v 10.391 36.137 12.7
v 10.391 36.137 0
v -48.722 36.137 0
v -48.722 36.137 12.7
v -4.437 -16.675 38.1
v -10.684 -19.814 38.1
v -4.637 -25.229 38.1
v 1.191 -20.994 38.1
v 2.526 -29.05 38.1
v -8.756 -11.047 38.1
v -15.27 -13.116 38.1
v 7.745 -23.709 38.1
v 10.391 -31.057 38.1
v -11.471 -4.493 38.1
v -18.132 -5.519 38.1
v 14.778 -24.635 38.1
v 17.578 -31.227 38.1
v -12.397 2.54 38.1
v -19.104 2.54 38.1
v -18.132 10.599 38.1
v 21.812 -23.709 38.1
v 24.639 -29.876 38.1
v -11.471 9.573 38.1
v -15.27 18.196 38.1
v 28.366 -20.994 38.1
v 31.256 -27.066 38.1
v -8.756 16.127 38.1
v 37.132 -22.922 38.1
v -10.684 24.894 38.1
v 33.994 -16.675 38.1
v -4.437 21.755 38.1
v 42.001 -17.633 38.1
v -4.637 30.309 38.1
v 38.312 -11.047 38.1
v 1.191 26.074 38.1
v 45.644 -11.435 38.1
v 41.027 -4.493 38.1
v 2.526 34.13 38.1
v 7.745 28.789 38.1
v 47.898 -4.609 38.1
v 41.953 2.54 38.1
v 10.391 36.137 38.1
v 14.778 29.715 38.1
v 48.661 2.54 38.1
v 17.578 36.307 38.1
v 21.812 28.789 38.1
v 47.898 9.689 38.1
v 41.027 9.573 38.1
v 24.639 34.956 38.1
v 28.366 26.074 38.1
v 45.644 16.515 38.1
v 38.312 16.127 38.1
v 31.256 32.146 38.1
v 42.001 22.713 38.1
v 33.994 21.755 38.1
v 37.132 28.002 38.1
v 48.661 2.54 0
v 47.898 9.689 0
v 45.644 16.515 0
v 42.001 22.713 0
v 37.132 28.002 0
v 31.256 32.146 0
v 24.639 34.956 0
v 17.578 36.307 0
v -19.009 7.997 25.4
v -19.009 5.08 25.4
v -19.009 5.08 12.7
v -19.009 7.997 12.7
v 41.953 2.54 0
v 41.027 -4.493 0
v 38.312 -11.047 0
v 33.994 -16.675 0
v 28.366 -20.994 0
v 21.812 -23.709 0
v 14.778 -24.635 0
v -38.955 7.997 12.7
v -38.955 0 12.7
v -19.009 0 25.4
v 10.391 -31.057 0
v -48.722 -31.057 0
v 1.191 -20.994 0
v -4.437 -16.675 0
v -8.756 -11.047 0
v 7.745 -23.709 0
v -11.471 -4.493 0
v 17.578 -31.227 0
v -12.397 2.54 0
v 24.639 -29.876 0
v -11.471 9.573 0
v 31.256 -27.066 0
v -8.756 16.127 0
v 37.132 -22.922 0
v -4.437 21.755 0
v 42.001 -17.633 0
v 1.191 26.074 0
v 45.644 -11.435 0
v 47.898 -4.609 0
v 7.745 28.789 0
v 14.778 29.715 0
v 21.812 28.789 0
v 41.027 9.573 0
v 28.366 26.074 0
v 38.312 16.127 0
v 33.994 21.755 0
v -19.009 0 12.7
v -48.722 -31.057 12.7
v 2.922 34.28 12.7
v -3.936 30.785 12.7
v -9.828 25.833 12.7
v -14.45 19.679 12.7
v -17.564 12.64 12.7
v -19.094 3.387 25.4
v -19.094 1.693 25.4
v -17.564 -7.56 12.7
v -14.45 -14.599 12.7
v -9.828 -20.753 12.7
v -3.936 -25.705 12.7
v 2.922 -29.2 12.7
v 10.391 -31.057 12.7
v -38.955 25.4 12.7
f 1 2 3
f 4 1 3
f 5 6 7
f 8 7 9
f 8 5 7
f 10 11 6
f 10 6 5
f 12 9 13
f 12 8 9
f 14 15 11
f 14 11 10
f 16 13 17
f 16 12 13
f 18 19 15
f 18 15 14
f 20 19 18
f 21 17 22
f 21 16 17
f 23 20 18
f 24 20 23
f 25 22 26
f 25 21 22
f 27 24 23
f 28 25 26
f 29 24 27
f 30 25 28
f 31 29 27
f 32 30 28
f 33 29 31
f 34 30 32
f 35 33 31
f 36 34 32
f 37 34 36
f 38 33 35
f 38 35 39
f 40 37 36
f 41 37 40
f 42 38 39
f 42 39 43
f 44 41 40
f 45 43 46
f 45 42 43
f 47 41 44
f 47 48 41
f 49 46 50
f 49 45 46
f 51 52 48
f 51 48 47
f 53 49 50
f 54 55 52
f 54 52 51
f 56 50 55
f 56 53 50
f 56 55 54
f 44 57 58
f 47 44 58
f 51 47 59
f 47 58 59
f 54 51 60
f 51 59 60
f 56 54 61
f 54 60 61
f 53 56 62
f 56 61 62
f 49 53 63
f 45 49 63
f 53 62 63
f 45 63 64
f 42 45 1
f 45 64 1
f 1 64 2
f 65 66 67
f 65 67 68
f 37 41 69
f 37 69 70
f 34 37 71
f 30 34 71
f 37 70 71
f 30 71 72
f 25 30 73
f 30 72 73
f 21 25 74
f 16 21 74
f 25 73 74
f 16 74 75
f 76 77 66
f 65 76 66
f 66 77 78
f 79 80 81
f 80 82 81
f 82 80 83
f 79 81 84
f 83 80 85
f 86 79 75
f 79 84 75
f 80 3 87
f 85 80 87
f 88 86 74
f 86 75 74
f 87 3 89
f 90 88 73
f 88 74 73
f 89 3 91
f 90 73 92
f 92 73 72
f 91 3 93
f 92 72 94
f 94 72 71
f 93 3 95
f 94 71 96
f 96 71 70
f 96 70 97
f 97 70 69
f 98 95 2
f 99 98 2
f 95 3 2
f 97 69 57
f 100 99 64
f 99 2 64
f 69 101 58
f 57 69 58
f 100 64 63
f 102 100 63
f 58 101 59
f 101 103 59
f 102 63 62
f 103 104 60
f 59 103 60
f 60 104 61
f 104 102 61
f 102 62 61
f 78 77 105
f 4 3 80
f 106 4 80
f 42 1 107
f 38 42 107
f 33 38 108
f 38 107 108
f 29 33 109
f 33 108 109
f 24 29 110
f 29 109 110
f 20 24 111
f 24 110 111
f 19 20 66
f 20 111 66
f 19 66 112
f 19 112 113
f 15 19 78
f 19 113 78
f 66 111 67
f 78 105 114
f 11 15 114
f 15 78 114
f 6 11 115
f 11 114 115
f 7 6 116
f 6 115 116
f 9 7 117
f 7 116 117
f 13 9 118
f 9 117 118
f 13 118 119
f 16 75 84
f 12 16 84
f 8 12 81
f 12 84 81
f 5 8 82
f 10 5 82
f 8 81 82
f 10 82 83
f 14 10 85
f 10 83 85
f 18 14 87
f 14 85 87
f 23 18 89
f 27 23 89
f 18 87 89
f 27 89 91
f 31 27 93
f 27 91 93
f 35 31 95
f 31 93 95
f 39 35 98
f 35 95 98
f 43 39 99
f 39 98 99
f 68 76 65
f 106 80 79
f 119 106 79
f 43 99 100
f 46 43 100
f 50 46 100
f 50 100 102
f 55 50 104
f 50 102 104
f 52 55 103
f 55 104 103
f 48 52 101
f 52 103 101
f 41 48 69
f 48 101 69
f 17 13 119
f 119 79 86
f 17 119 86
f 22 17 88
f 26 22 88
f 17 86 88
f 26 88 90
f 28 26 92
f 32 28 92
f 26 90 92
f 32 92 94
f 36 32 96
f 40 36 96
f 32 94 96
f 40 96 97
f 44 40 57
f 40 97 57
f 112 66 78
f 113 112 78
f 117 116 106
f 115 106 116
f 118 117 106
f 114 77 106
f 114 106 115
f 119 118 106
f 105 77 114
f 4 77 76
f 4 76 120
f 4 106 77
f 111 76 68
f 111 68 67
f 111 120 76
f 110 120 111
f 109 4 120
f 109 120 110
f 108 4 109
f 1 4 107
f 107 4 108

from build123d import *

# Parameters (mm, degrees)
F1_DEPTH = 12.7
F2_DEPTH = 38.1
F3_W     = 19.9459594991
F3_H     = 7.9969605431
F4_DEPTH = 12.7
F6_DEPTH = 25.4


with BuildPart() as f1:
    # F0 (on Top) → F1 (new body)
    with BuildSketch(Plane.XY):
        with BuildLine():
            Line((10.3908990951, 36.1372716725), (-48.721820116, 36.1372716725))
            Line((-48.721820116, 36.1372716725), (-48.721820116, -31.0572721064))
            Line((-48.721820116, -31.0572721064), (10.3908990951, -31.0572721064))
            ThreePointArc((10.3908990951, -31.0572721064), (-19.1043346565, 2.539999783), (10.3908990951, 36.1372716725))
        make_face()
    extrude(amount=F1_DEPTH)

    # F0 (on Top) → F2 (join)
    with BuildSketch(Plane.XY):
        with BuildLine():
            ThreePointArc((48.6606984776, 2.539999783), (37.1318476752, 28.0024929013), (10.3908990951, 36.1372716725))
            Line((10.3908990951, 36.1372716725), (14.7781819105, 36.1372716725))
            Line((14.7781819105, 36.1372716725), (14.7781819105, 29.7147905973))
            ThreePointArc((14.7781819105, 29.7147905973), (33.9936607726, 21.7554786451), (41.9529727248, 2.539999783))
            ThreePointArc((41.9529727248, 2.539999783), (33.9936607726, -16.675479079), (14.7781819105, -24.6347910312))
            Line((14.7781819105, -24.6347910312), (14.7781819105, -31.0572721064))
            Line((14.7781819105, -31.0572721064), (10.3908990951, -31.0572721064))
            ThreePointArc((10.3908990951, -31.0572721064), (37.1318476752, -22.9224933352), (48.6606984776, 2.539999783))
        make_face()
        with BuildLine():
            Line((14.7781819105, 36.1372716725), (10.3908990951, 36.1372716725))
            ThreePointArc((10.3908990951, 36.1372716725), (-19.1043346565, 2.539999783), (10.3908990951, -31.0572721064))
            Line((10.3908990951, -31.0572721064), (14.7781819105, -31.0572721064))
            Line((14.7781819105, -31.0572721064), (14.7781819105, -24.6347910312))
            ThreePointArc((14.7781819105, -24.6347910312), (-12.3966089037, 2.539999783), (14.7781819105, 29.7147905973))
            Line((14.7781819105, 29.7147905973), (14.7781819105, 36.1372716725))
        make_face()
    extrude(amount=F2_DEPTH)

    # F3 (on face) → F4 (join)
    with BuildSketch(Plane.XY.offset(12.7)):
        with Locations((-28.9819748448, 3.9984802715)):
            Rectangle(F3_W, F3_H)
    extrude(amount=F4_DEPTH)

    # F5 (on face) → F6 (cut)
    with BuildSketch(Plane.XZ):
        Polygon((-38.9549545944, 12.7), (-19.0089950952, 25.4), (-38.9549545944, 25.4), align=None)
    extrude(amount=-F6_DEPTH, mode=Mode.SUBTRACT)


solid = f1.part
